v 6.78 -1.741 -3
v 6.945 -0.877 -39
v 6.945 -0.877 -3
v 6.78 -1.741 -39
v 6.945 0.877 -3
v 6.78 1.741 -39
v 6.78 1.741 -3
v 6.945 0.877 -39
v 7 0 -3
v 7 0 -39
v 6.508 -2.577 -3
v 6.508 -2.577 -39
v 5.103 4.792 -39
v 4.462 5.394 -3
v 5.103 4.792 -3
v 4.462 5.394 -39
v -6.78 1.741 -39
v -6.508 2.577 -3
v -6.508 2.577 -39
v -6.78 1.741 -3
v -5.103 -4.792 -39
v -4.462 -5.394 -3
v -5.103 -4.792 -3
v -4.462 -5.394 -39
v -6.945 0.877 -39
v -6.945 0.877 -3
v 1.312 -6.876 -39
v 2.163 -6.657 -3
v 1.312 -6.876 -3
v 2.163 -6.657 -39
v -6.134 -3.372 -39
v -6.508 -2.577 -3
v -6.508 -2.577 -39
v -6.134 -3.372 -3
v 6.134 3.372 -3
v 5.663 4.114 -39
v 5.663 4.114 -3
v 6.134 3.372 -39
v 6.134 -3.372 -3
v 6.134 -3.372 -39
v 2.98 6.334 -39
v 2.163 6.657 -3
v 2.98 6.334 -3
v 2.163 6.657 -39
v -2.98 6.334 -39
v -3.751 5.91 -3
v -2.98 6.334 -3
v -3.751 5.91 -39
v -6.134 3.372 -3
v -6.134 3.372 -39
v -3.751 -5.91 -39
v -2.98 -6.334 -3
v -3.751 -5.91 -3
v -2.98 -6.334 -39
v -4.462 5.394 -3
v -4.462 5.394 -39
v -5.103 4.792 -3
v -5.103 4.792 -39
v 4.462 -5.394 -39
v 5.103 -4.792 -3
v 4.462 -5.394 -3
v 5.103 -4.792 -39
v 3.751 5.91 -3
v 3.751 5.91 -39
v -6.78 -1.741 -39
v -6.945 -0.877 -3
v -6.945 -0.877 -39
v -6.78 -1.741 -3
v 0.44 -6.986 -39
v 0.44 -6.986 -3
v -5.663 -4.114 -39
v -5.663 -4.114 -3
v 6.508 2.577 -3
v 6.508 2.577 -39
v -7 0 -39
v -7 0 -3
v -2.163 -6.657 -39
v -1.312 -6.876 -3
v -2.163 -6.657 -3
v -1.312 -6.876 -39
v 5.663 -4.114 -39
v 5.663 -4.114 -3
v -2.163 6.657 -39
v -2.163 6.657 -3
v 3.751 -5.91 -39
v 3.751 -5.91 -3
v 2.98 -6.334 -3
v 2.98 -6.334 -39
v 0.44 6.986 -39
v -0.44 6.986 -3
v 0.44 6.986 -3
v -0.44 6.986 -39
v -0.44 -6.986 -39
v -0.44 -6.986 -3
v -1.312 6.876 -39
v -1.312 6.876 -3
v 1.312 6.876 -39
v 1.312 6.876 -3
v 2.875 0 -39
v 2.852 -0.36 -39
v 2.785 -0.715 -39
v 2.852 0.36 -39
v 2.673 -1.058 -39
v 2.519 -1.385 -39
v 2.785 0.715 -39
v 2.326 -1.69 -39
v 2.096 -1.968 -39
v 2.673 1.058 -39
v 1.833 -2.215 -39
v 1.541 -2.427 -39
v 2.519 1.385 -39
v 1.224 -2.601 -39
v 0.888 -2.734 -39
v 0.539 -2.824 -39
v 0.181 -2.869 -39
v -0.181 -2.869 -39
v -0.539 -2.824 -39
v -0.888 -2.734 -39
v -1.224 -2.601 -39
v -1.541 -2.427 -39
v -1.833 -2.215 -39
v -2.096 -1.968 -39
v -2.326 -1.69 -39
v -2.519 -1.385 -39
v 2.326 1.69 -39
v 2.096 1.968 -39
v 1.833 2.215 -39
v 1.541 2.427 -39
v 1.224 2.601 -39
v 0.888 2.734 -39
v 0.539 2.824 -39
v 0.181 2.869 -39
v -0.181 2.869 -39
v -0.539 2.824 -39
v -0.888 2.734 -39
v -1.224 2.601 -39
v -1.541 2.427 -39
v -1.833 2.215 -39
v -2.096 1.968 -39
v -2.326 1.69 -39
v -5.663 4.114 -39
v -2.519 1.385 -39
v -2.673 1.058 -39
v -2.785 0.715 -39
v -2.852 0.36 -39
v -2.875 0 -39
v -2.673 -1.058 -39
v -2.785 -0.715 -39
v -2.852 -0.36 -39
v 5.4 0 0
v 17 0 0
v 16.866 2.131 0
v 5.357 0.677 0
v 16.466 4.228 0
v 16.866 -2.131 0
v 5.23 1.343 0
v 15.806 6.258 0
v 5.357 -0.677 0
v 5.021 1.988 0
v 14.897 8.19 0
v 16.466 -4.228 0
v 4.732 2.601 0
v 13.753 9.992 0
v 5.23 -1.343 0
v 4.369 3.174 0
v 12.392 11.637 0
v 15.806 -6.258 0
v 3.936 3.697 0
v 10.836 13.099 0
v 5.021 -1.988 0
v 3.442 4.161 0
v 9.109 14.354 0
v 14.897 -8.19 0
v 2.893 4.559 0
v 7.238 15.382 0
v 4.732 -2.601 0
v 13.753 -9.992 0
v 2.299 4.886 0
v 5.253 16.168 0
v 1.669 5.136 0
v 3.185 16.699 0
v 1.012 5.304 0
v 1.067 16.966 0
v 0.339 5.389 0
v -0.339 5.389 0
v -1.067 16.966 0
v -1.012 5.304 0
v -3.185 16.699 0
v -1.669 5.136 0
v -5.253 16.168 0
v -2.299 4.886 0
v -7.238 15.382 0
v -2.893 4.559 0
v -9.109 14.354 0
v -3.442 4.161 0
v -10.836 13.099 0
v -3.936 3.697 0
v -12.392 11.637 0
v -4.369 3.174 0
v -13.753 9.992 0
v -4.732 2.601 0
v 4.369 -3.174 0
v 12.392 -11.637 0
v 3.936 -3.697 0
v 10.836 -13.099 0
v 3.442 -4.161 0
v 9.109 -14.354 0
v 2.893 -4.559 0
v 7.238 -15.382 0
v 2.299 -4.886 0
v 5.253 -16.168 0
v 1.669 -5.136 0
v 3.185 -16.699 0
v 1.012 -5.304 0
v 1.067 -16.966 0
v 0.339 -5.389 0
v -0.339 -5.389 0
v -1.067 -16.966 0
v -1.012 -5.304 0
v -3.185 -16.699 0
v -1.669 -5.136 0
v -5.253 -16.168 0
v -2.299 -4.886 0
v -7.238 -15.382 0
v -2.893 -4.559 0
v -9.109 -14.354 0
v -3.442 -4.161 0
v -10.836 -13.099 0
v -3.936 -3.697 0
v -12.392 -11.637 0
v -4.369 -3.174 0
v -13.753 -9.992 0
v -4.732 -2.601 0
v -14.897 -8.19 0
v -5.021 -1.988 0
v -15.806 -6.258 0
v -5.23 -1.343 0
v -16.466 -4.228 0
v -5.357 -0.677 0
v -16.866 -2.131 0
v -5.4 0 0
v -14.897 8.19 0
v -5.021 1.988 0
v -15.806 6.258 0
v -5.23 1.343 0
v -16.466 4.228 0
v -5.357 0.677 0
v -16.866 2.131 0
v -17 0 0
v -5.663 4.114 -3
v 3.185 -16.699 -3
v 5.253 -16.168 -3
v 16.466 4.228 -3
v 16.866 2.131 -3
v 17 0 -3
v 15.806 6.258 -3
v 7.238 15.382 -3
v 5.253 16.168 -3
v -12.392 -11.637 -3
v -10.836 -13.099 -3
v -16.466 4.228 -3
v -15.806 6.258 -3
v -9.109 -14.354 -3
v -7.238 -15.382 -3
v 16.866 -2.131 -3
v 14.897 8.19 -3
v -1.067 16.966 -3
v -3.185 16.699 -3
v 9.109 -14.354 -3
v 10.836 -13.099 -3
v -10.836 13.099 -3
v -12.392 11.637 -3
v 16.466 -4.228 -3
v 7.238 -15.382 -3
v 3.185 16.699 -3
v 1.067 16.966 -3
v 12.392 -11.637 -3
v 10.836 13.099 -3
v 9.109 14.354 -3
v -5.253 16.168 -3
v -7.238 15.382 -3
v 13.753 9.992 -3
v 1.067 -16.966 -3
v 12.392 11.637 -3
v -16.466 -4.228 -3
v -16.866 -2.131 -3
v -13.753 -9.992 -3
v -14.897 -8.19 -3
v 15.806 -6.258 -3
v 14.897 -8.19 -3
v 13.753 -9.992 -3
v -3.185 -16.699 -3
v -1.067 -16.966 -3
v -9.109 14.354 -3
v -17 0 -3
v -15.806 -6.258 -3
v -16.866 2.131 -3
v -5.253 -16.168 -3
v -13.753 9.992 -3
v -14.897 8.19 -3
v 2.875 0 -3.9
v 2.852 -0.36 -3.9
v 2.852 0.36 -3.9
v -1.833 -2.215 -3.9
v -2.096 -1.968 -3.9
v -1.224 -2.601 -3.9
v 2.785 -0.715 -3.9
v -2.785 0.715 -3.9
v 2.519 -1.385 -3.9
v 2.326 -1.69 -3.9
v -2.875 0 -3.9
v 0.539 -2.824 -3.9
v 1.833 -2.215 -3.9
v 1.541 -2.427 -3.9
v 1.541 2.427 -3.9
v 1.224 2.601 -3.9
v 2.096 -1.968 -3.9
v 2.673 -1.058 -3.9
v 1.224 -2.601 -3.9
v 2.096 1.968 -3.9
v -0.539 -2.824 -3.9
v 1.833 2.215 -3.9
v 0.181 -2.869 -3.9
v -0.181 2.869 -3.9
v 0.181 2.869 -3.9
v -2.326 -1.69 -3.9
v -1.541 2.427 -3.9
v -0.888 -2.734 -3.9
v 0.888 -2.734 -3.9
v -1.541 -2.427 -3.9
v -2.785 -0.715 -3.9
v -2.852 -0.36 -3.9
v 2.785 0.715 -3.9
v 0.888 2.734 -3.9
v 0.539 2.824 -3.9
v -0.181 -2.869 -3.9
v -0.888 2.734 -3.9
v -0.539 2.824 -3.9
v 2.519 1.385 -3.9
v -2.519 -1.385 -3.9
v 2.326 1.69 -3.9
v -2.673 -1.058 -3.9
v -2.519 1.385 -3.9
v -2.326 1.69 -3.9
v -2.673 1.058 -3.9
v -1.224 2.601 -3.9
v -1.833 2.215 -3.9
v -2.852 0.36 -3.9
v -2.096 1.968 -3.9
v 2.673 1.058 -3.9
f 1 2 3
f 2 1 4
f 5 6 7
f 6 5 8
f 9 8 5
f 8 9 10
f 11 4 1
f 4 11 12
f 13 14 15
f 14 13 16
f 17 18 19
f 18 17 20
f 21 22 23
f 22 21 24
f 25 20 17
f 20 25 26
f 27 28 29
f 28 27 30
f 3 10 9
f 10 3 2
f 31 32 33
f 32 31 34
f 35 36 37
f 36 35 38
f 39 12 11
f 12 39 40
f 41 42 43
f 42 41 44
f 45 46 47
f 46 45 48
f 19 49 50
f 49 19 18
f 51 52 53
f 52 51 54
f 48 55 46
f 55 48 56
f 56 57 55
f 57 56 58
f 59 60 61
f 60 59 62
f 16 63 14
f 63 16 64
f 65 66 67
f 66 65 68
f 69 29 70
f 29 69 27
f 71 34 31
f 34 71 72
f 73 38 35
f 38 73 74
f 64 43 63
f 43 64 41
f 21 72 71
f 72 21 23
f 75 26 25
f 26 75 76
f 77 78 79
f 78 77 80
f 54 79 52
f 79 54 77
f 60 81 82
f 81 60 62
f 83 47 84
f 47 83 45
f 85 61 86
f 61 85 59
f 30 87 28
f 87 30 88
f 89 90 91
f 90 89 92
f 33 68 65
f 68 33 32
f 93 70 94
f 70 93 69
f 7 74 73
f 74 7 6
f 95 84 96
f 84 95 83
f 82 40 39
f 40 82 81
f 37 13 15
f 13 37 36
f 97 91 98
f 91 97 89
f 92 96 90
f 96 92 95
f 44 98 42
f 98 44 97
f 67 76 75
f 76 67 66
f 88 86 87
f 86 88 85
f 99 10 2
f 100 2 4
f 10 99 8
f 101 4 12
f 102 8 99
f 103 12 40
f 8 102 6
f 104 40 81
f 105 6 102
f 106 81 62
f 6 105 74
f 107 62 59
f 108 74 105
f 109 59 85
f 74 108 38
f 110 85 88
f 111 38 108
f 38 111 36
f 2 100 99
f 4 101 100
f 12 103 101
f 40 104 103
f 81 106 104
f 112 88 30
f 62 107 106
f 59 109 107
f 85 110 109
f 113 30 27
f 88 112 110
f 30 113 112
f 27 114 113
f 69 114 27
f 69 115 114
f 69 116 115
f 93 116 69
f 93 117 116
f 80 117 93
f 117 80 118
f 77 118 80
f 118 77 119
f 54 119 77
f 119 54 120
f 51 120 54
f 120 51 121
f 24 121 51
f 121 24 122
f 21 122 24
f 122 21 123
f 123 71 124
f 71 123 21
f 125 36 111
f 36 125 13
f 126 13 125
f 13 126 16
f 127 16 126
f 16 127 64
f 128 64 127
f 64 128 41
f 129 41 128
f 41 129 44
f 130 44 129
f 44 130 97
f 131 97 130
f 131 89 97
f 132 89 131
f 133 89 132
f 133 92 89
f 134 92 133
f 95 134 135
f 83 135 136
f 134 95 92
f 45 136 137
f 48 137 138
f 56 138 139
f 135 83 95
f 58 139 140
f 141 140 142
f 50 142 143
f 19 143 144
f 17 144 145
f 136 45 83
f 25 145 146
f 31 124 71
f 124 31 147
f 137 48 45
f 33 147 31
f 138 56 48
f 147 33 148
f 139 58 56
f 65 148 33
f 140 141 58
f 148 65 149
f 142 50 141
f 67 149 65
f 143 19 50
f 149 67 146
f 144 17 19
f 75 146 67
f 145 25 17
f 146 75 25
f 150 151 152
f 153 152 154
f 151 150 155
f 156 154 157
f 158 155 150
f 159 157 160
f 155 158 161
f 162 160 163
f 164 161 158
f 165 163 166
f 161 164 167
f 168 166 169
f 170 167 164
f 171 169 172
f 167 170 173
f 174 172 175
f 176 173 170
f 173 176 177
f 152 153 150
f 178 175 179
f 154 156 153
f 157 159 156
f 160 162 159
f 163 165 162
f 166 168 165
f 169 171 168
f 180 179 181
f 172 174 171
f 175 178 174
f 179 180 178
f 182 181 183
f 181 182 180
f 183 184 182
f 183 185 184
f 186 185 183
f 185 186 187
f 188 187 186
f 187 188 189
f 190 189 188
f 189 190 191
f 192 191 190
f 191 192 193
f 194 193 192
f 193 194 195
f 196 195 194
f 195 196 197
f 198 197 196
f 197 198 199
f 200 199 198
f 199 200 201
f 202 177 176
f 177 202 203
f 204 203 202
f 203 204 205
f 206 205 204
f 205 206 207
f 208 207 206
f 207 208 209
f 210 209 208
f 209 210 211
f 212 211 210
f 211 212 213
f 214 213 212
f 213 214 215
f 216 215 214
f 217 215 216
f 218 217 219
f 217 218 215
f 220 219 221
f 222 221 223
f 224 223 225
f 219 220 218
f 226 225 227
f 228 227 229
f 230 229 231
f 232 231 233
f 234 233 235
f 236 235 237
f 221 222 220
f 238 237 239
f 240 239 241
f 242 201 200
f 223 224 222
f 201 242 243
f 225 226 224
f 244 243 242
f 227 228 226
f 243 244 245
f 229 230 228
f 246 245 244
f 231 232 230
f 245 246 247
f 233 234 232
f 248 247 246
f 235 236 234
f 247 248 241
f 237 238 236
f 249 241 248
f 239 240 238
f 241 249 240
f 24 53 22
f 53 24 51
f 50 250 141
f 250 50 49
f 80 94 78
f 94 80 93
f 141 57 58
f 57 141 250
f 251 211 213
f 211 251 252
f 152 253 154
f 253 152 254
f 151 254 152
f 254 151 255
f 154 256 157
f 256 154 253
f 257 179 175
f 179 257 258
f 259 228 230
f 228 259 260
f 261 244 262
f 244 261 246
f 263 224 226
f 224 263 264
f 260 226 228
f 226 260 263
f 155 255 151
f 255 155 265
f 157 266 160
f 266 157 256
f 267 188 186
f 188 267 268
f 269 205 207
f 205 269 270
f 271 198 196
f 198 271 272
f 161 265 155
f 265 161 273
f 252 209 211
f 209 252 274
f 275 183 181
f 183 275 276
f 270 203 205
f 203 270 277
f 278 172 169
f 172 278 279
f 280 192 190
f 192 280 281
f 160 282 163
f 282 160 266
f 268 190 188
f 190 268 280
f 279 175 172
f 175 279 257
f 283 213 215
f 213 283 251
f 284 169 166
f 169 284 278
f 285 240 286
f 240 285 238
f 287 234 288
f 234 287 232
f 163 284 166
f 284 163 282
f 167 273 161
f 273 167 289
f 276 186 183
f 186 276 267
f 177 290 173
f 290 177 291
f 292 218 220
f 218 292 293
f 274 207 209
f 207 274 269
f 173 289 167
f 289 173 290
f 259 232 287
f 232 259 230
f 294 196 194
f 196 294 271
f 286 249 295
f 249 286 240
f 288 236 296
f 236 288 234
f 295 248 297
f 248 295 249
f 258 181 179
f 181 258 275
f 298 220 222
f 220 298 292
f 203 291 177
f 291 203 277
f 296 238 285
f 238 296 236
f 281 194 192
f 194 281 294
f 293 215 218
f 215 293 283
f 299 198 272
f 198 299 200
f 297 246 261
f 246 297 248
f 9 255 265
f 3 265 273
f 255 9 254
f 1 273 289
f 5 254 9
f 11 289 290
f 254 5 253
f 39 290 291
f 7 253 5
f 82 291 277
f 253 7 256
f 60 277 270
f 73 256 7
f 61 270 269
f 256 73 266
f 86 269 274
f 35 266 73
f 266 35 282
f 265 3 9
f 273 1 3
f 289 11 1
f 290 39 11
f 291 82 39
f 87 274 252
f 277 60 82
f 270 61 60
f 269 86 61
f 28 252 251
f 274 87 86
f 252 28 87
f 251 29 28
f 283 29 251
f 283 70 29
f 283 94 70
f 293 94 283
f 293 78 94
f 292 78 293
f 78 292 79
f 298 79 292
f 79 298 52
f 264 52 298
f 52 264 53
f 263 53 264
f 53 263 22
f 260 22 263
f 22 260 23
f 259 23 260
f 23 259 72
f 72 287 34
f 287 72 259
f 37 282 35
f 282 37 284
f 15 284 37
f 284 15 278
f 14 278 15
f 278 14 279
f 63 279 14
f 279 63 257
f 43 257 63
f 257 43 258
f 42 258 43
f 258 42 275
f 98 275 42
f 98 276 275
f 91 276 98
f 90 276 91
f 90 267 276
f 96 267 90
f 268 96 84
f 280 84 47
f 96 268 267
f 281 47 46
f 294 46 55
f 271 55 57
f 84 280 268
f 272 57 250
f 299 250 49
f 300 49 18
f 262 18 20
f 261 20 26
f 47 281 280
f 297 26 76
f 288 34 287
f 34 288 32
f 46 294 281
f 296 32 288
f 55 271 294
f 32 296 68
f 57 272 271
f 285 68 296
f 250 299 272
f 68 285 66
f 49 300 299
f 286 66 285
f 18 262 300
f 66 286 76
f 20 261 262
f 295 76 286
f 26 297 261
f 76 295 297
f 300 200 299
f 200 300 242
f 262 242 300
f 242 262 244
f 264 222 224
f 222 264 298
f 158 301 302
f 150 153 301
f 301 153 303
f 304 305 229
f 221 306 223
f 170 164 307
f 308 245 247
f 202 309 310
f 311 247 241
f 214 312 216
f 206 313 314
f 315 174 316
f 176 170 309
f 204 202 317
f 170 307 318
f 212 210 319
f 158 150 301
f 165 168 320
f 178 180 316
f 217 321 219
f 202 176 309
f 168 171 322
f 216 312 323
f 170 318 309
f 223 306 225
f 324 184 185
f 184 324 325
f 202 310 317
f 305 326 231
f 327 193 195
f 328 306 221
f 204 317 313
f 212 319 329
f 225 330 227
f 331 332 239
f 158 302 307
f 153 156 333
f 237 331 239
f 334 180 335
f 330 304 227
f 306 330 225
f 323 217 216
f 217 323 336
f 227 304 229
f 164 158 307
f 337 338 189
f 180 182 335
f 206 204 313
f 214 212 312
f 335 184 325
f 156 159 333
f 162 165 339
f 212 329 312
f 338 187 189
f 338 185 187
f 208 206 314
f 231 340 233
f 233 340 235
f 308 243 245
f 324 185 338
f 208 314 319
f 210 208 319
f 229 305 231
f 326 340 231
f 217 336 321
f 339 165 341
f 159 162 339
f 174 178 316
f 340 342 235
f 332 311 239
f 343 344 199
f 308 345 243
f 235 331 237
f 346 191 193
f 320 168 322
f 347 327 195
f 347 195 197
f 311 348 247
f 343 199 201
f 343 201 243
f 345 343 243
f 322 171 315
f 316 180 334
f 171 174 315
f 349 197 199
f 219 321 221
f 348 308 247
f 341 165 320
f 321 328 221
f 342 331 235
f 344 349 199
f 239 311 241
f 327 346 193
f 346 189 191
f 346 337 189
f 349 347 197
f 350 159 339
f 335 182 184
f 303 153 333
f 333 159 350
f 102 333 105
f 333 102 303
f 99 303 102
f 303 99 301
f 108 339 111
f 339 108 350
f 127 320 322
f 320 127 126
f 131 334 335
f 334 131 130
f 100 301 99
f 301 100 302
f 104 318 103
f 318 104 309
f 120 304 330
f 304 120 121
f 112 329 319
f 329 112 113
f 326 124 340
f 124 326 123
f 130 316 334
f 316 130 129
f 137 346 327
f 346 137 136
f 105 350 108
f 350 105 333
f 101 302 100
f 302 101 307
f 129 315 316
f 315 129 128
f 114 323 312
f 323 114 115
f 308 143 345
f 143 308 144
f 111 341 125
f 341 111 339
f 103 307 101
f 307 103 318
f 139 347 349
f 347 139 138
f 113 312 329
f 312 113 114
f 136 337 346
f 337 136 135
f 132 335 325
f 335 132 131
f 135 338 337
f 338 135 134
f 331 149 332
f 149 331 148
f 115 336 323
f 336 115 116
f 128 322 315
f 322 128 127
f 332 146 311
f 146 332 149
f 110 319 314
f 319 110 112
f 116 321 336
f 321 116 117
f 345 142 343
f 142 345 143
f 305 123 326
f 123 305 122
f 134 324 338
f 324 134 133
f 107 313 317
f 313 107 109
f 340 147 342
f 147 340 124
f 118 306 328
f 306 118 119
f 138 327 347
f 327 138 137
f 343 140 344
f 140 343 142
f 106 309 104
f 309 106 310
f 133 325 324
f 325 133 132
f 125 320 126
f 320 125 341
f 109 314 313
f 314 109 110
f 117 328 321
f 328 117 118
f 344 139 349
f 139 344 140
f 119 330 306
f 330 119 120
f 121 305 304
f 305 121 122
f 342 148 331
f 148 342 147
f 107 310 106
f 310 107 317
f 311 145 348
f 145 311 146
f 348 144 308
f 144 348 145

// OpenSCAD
$fn = 50;


difference() {
	union() {
		translate(v = [0, 0, -39.0000000000]) {
			cylinder(h = 39, r = 7.0000000000);
		}
		translate(v = [0, 0, -3.0000000000]) {
			cylinder(h = 3, r = 17.0000000000);
		}
	}
	union() {
		translate(v = [0, 0, 0]) {
			rotate(a = [0, 0, 0]) {
				difference() {
					union() {
						#translate(v = [0, 0, -39.0000000000]) {
							cylinder(h = 39, r = 2.6000000000);
						}
						#translate(v = [0, 0, -3.9000000000]) {
							cylinder(h = 3.9000000000, r = 7.0000000000, r1 = 2.8750000000, r2 = 5.4000000000);
						}
						#translate(v = [0, 0, -39.0000000000]) {
							cylinder(h = 39, r = 2.8750000000);
						}
						#translate(v = [0, 0, -39.0000000000]) {
							cylinder(h = 39, r = 2.6000000000);
						}
					}
					union();
				}
			}
		}
	}
}
